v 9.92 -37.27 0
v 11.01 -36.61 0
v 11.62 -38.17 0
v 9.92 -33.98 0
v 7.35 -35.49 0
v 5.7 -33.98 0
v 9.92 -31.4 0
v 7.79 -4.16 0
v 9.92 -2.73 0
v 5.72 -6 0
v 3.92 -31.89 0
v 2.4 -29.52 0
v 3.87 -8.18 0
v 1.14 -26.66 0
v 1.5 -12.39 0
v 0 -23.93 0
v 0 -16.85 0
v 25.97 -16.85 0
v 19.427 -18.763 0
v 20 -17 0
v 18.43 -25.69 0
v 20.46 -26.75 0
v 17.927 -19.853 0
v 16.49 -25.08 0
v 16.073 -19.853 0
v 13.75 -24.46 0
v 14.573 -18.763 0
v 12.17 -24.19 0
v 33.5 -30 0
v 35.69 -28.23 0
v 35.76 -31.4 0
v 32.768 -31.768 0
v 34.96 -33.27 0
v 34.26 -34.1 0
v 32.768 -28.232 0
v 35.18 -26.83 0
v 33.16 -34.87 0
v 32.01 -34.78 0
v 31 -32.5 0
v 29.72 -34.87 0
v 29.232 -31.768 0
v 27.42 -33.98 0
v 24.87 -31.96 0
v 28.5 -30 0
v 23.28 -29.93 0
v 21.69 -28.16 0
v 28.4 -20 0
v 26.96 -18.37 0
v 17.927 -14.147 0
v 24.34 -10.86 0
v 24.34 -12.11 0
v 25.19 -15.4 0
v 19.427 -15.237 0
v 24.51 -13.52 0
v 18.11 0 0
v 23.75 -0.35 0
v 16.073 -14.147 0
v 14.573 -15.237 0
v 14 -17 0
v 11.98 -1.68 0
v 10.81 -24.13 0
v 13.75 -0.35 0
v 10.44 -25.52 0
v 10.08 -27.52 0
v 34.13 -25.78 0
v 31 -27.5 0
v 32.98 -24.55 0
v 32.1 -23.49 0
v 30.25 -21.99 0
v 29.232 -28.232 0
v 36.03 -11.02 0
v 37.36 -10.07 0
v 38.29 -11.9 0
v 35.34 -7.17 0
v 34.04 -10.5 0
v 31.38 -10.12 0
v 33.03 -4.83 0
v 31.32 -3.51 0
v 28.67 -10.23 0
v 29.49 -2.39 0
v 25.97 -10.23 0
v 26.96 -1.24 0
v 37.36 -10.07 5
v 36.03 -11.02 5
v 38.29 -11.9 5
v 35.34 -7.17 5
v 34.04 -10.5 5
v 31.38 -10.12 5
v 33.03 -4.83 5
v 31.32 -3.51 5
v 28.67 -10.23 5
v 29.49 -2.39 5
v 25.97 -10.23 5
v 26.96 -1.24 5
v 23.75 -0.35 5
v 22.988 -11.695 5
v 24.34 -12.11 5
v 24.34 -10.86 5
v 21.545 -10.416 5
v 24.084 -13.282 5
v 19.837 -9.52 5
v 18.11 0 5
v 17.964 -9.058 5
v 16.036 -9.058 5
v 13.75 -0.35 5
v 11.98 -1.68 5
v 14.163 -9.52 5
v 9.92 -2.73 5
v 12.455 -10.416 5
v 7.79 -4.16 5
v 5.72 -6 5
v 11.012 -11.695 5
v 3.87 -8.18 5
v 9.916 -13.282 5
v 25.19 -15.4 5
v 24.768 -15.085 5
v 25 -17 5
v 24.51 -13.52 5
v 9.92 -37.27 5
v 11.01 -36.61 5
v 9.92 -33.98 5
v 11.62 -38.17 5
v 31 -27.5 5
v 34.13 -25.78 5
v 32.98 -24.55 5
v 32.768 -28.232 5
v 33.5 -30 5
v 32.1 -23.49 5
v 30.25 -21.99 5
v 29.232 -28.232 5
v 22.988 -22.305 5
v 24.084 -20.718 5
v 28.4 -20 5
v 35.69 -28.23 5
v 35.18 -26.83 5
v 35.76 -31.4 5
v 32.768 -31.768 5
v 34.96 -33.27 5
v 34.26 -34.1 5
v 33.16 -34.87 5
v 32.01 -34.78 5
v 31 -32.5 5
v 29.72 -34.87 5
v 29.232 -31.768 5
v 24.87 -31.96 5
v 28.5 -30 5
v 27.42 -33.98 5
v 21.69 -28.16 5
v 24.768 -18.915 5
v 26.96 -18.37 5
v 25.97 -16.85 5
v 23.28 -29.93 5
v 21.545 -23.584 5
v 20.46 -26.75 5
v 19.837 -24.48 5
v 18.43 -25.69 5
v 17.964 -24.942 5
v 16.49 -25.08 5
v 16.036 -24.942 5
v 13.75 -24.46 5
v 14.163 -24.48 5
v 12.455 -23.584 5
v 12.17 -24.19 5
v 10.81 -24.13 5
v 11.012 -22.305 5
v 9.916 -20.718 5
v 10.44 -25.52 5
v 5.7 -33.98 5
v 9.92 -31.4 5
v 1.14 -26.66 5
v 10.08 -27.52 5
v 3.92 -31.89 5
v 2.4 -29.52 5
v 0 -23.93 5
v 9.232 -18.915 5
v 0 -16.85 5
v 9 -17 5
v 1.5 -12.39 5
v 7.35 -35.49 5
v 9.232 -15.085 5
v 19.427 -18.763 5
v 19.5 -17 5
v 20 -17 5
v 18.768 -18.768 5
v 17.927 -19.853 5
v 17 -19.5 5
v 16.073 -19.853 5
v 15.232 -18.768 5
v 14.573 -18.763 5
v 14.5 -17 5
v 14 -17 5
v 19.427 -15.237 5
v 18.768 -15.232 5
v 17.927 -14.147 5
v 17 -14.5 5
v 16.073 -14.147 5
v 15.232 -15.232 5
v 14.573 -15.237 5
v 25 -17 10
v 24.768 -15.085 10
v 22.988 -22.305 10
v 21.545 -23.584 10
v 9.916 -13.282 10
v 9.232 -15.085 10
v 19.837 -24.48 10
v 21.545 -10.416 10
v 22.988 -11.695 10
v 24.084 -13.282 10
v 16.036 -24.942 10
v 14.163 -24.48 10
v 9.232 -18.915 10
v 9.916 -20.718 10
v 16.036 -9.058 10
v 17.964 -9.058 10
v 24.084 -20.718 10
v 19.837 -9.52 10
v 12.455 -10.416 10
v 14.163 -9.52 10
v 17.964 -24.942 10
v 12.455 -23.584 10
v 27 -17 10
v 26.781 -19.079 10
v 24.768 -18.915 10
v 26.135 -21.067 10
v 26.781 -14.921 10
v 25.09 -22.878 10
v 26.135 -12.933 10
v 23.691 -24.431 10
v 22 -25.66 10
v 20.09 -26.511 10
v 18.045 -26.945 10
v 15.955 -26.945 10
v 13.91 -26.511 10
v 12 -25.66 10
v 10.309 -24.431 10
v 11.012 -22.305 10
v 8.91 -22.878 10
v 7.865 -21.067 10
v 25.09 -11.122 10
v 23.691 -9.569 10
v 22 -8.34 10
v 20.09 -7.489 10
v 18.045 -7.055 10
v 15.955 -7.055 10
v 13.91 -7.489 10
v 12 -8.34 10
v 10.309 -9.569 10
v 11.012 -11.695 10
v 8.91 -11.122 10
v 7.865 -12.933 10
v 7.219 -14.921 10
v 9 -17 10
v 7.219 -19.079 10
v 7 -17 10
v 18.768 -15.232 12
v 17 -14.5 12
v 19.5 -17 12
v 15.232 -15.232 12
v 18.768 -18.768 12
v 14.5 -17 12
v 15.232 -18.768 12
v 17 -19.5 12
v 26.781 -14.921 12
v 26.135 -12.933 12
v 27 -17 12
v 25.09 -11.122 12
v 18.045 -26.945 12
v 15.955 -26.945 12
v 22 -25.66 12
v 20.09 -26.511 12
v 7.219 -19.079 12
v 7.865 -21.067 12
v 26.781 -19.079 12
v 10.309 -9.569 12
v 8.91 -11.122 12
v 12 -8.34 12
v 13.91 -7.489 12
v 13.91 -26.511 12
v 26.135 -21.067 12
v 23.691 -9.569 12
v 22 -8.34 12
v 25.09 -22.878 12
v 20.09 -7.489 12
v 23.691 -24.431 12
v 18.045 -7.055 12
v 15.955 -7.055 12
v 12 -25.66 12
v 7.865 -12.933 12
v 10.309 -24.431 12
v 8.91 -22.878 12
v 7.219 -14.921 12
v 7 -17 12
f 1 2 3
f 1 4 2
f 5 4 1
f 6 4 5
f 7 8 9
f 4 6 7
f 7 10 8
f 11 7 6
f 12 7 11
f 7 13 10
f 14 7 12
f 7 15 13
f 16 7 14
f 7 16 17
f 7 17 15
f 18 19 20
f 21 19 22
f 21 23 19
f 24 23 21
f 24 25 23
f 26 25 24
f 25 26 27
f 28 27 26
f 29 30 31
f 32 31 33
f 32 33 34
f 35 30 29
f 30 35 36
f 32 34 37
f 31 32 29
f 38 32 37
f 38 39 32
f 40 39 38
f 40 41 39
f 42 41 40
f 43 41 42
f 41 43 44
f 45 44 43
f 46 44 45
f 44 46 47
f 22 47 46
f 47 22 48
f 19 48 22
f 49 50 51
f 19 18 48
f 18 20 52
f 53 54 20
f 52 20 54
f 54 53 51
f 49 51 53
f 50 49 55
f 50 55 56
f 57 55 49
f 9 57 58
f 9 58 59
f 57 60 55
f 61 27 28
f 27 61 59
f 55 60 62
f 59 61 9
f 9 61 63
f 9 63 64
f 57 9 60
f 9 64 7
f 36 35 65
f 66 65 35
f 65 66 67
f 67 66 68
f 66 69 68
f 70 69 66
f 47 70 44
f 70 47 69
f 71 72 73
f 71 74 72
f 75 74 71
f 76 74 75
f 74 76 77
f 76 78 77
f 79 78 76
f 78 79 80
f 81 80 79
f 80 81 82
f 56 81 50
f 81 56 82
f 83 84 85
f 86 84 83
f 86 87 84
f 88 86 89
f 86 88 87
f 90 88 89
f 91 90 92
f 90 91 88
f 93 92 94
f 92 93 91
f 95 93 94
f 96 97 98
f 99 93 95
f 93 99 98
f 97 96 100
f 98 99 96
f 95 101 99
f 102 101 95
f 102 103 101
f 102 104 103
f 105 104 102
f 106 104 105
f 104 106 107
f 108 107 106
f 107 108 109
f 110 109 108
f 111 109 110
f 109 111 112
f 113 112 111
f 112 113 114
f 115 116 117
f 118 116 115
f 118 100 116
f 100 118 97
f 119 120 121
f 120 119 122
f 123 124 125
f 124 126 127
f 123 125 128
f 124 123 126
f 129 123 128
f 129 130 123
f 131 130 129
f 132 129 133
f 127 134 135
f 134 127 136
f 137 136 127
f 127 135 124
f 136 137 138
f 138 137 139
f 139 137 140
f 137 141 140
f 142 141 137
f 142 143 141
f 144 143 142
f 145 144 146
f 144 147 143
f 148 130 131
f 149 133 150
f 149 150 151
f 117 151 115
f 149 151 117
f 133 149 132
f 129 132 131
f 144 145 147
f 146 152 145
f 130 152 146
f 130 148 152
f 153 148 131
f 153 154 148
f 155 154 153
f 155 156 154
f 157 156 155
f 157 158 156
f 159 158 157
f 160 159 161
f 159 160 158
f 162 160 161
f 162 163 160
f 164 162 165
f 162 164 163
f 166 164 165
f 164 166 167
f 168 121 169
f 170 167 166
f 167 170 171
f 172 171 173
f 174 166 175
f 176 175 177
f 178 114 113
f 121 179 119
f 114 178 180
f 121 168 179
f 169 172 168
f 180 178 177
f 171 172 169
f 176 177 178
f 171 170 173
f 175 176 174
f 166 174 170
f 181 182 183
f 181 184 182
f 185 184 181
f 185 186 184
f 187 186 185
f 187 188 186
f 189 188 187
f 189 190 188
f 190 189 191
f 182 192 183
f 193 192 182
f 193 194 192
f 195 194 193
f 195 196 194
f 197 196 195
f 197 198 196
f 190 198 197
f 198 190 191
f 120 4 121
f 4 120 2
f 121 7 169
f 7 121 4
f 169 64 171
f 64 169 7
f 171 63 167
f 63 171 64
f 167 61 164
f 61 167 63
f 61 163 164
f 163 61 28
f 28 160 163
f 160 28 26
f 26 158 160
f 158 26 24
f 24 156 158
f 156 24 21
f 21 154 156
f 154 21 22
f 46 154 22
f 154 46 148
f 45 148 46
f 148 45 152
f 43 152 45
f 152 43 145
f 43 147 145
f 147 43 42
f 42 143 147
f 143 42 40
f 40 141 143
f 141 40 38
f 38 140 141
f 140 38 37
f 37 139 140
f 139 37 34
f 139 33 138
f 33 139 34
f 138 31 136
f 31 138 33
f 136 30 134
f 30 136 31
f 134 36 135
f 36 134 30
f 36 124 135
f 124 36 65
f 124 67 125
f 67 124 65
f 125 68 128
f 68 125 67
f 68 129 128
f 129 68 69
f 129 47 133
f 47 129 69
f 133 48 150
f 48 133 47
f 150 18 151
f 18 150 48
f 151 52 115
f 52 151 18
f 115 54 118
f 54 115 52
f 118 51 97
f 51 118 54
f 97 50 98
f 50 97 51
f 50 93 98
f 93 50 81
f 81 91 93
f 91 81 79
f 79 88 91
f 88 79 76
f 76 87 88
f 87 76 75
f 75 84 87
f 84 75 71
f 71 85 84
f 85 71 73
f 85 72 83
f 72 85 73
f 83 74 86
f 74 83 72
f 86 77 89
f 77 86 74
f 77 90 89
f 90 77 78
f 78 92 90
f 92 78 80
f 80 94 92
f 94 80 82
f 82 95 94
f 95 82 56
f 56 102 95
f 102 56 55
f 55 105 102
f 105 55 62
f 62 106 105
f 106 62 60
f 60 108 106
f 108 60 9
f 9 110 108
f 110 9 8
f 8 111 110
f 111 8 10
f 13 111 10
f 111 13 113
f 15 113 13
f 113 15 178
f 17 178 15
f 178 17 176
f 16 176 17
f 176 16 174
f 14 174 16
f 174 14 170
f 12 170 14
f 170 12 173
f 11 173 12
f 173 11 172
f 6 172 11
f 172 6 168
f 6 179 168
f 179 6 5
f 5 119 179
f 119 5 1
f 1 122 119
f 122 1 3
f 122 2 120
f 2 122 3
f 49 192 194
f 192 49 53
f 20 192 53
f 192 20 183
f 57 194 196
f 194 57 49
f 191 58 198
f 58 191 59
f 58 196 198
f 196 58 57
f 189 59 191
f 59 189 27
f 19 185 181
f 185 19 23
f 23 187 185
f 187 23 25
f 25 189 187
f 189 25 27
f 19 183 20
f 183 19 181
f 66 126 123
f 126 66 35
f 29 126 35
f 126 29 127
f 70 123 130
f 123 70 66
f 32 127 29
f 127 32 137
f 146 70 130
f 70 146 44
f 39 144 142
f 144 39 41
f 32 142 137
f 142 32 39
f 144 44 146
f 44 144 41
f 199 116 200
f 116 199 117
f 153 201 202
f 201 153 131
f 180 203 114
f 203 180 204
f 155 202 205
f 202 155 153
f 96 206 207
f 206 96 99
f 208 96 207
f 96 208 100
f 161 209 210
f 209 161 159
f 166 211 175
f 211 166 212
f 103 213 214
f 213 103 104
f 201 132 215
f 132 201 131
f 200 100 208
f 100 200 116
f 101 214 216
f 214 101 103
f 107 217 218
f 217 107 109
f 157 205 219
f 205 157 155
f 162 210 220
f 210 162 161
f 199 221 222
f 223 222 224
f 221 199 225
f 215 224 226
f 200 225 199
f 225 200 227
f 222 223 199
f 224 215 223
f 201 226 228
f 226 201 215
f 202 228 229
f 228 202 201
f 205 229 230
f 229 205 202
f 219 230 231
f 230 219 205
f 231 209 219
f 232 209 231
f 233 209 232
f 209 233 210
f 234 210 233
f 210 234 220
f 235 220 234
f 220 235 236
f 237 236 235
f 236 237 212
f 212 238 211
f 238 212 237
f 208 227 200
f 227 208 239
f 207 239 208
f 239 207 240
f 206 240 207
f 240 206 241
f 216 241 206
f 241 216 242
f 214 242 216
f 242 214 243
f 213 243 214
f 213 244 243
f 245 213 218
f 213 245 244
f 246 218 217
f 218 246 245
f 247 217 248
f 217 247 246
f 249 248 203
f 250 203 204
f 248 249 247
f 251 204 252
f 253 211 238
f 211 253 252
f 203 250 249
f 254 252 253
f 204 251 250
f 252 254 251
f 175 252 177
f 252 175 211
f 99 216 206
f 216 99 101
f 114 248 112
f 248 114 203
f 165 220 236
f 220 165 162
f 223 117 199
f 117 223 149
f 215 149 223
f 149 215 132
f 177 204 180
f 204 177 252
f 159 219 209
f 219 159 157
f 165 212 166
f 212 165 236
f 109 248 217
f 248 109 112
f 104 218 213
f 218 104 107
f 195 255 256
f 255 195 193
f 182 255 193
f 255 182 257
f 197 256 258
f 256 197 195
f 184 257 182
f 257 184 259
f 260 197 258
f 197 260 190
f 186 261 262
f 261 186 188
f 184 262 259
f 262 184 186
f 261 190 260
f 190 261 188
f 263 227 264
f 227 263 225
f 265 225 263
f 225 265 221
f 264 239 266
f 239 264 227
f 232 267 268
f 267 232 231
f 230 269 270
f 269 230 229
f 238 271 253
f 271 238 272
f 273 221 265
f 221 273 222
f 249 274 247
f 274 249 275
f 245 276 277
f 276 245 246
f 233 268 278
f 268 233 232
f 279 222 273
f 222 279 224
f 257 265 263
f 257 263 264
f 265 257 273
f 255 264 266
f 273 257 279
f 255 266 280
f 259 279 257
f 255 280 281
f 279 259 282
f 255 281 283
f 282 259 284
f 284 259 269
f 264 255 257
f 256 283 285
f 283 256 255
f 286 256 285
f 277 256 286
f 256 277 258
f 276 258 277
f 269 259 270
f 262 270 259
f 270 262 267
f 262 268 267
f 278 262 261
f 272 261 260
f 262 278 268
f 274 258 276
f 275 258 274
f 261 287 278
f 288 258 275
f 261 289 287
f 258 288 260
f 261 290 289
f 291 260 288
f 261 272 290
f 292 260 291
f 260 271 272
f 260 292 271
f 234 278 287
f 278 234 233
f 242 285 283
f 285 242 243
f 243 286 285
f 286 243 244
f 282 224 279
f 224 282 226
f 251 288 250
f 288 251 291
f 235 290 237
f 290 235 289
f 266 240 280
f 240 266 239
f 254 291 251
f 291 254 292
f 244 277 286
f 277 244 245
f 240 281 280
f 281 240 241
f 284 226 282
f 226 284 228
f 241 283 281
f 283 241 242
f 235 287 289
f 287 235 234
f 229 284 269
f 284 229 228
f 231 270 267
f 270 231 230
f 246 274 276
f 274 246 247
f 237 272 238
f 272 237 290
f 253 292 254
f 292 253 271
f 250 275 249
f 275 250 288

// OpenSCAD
difference(){

linear_extrude(height = 5, center = false) {

polygon(points=[[34.26,-34.1],[34.96,-33.27],[35.76,-31.4],[35.69,-28.23],[35.18,-26.83],[34.13,-25.78],[32.98,-24.55],[32.1,-23.49],[30.25,-21.99],[28.4,-20],[26.96,-18.37],[25.97,-16.85],[25.19,-15.4],[24.51,-13.52],[24.34,-12.11],[24.34,-10.86],[25.97,-10.23],[28.67,-10.23],[31.38,-10.12],[34.04,-10.5],[36.03,-11.02],[38.29,-11.9],[37.36,-10.07],[35.34,-7.17],[33.03,-4.83],[31.32,-3.51],[29.49,-2.39],[26.96,-1.24],[23.75,-0.35],[18.11,0],[13.75,-0.35],[11.98,-1.68],[9.92,-2.73],[7.79,-4.16],[5.72,-6],[3.87,-8.18],[1.5,-12.39],[0,-16.85],[0,-20.96],[0,-23.93],[1.14,-26.66],[2.4,-29.52],[3.92,-31.89],[5.7,-33.98],[7.35,-35.49],[9.92,-37.27],[11.62,-38.17],[11.01,-36.61],[9.92,-33.98],[9.92,-31.4],[10.08,-27.52],[10.44,-25.52],[10.81,-24.13],[12.17,-24.19],[13.75,-24.46],[16.49,-25.08],[18.43,-25.69],[20.46,-26.75],[21.69,-28.16],[23.28,-29.93],[24.87,-31.96],[27.42,-33.98],[29.72,-34.87],[32.01,-34.78],[33.16,-34.87]]);

}

translate([17,-17,-2]) cylinder(h=8, r=3);
translate([31,-30,-2]) cylinder(h=8, r=2.5);
}

difference(){
	translate([17,-17,5]) cylinder(h=5,r=8);

	translate([17,-17,3]) cylinder(h=10,r=2.5);
}

difference(){
	translate([17,-17,10]) cylinder(h=2,r=10);

	translate([17,-17,7]) cylinder(h=14, r=2.5);
}
